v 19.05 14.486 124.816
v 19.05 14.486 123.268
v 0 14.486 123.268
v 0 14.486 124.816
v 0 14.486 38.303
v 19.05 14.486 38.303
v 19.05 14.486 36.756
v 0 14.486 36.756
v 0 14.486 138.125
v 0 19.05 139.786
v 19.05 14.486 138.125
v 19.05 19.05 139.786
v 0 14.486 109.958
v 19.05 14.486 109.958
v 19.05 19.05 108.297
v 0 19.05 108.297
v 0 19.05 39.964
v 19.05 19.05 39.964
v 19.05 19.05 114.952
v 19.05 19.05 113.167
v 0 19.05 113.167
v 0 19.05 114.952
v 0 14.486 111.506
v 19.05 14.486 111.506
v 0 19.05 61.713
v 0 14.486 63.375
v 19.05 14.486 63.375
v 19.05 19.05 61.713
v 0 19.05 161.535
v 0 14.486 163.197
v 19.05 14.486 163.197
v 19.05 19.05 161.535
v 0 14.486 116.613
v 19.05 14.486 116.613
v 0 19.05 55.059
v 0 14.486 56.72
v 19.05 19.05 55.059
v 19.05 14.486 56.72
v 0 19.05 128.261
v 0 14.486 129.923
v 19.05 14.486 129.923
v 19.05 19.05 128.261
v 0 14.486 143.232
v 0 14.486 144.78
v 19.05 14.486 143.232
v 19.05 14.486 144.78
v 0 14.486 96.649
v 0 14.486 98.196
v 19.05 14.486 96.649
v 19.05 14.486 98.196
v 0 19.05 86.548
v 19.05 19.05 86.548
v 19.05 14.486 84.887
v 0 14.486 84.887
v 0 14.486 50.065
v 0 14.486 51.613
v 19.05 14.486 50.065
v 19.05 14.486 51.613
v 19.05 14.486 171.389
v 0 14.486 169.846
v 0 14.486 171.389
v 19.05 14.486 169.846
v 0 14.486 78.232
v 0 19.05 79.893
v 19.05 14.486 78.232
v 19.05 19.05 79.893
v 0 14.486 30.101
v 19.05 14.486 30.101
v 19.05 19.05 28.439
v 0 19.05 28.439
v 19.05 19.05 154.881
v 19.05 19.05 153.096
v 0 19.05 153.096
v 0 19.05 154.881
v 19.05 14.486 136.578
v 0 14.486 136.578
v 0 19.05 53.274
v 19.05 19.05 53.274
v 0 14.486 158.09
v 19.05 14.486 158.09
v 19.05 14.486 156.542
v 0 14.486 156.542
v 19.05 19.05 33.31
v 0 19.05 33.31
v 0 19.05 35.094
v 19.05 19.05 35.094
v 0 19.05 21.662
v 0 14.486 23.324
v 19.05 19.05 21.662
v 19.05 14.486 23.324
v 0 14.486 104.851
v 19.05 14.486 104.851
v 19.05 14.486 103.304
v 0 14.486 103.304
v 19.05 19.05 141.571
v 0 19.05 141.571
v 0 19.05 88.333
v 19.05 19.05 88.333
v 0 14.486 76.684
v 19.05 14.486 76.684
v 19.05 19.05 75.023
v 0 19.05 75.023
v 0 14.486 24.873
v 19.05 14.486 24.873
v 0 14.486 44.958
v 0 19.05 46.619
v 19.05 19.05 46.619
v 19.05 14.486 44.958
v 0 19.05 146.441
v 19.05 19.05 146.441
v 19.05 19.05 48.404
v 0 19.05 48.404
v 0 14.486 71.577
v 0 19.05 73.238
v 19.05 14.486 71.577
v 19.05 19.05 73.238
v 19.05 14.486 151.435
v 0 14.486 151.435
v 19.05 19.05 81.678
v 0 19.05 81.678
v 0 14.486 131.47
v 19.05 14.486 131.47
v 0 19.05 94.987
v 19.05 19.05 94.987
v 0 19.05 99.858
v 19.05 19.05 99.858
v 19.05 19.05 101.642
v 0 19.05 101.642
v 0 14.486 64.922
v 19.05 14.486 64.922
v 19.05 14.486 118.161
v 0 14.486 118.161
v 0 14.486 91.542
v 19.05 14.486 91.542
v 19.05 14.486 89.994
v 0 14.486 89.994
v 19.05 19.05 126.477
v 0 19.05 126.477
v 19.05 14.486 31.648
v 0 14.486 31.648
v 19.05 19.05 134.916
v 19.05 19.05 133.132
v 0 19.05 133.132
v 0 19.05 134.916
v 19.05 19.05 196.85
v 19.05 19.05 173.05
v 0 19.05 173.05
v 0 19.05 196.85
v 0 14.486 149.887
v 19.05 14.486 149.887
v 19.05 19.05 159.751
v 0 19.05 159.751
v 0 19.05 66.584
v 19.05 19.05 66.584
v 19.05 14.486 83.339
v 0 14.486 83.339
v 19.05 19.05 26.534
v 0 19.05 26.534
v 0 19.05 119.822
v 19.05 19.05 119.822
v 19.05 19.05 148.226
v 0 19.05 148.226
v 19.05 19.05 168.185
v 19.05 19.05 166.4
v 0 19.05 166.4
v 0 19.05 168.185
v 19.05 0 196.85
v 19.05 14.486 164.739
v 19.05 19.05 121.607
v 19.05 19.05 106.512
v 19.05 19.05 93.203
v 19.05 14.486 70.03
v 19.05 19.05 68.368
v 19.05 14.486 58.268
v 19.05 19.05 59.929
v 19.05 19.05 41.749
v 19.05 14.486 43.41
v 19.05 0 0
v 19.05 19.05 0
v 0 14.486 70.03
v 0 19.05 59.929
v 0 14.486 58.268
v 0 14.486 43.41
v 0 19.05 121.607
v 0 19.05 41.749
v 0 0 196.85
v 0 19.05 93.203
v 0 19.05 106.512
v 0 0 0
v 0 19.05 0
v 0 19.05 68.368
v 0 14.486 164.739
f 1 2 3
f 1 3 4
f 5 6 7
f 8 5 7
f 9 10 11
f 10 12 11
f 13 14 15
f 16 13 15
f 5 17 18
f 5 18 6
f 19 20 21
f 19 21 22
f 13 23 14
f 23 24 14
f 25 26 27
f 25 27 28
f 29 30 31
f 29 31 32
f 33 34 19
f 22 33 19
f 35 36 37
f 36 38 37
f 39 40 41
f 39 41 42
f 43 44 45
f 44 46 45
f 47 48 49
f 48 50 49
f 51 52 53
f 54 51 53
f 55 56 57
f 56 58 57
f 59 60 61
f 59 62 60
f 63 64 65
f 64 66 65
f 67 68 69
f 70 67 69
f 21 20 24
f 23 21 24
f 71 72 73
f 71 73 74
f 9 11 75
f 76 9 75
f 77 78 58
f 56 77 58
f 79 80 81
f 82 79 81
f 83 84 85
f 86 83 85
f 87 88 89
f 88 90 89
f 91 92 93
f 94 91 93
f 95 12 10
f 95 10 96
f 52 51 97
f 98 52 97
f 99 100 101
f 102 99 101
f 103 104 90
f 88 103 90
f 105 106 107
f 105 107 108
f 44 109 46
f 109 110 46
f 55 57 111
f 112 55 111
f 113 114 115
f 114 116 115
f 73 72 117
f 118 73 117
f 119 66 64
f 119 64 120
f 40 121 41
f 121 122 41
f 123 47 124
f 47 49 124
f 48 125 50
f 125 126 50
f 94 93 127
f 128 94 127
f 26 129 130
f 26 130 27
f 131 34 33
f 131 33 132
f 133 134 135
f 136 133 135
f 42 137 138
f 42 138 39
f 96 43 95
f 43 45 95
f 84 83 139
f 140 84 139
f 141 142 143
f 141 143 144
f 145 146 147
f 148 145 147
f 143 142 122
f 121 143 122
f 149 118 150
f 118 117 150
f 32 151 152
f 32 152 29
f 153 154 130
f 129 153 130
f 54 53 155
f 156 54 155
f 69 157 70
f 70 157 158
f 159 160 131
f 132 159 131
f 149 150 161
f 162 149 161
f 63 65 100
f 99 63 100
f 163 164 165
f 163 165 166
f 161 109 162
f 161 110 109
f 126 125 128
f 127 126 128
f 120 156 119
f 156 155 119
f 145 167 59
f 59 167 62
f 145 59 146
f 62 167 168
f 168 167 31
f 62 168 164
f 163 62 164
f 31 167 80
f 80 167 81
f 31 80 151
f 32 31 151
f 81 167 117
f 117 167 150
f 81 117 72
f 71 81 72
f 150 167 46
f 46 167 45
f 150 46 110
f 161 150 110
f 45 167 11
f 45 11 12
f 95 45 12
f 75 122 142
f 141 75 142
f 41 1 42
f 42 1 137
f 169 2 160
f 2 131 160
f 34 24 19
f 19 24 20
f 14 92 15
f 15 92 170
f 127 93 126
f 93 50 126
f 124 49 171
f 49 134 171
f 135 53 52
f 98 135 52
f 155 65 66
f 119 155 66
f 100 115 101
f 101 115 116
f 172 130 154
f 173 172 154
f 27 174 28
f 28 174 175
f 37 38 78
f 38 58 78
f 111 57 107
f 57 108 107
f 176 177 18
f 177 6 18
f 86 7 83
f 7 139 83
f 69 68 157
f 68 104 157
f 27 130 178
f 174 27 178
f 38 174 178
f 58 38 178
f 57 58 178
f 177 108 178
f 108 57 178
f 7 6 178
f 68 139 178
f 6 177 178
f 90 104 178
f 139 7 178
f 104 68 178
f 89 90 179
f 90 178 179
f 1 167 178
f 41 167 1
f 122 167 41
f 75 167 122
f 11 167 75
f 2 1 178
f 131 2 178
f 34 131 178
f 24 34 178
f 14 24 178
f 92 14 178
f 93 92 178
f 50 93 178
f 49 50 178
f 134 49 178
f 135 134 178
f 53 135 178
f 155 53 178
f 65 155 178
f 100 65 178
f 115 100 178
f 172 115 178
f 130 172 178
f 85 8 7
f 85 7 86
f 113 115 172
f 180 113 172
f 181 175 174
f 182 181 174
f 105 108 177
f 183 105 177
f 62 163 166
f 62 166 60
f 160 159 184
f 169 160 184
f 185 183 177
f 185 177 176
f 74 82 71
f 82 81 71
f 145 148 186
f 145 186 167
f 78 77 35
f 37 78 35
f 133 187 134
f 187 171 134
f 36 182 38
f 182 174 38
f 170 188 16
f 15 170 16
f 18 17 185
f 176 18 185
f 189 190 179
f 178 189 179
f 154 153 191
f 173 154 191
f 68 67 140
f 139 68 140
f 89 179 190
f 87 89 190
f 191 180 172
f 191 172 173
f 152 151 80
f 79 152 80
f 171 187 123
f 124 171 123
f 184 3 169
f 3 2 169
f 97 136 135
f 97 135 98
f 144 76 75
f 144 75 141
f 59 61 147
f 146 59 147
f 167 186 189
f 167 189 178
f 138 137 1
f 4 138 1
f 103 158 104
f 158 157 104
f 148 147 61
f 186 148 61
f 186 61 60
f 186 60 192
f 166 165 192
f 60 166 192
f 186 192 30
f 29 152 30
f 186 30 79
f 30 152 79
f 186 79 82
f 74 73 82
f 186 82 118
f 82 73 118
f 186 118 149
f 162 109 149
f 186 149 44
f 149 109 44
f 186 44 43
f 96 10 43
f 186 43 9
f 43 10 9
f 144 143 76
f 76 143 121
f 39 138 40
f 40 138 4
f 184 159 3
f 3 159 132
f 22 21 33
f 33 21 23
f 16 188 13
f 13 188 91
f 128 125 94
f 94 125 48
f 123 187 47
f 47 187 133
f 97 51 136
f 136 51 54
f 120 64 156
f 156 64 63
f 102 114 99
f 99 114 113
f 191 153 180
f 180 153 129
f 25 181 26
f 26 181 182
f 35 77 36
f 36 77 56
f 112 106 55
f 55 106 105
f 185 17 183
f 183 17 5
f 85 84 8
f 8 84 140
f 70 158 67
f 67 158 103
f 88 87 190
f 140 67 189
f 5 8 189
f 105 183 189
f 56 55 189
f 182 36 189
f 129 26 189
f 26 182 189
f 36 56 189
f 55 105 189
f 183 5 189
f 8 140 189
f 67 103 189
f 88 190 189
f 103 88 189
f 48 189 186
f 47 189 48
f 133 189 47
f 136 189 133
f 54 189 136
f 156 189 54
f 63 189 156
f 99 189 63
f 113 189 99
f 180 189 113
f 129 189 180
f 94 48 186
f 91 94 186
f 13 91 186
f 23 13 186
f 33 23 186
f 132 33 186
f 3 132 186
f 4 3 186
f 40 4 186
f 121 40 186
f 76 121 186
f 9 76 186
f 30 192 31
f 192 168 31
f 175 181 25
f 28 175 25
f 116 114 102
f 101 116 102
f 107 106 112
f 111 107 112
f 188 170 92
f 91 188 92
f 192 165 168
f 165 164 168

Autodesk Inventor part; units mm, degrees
sketch "Sketch1" plane through (0, 0, 0) normal (0, 0, 1) x (1, 0, 0)
  line L0 (0, 0) -> (19.05, 0)
  line L1 (19.05, 0) -> (19.05, 19.05)
  line L2 (19.05, 19.05) -> (0, 19.05)
  line L3 (0, 19.05) -> (0, 0)
  dimension "d0" = 19.05
  dimension "d1" = 19.05
extrude "Extrusion1" add sketch "Sketch1" along normal blind 196.85
sketch "Sketch2" plane through (19.05, 0, 0) normal (1, 0, 0) x (0, 0, -1)
  line L0 (0, 0) -> (0, 19.05) projected
  line L1 (0, 19.05) -> (-196.85, 19.05) projected
  line L2 (-196.85, 19.05) -> (-196.85, 0) projected
  line L3 (0, 0) -> (-196.85, 0) projected
  line L4 (-168.1851, 19.05) -> (-166.4005, 19.05)
  line L5 (-166.4005, 19.05) -> (-164.7392, 14.4856)
  line L6 (-168.1851, 19.05) -> (-169.8464, 14.4856)
  line L7 (-167.2928, 19.05) -> (-167.2928, 27.5407) construction
  line L8 (-130.1446, 19.8229) -> (-130.1446, 4.5609) construction
  line L9 (-173.4311, 16.9342) -> (-94.8151, 16.9342) construction
  line L10 (-163.1967, 14.4856) -> (-161.5354, 19.05)
  line L11 (-161.5354, 19.05) -> (-159.7508, 19.05)
  line L12 (-159.7508, 19.05) -> (-158.0895, 14.4856)
  line L13 (-164.7392, 14.4856) -> (-163.1967, 14.4856)
  line L14 (-158.0895, 14.4856) -> (-24.9935, 14.4856) construction
  line L15 (-160.6431, 19.05) -> (-160.6431, 25.2679) construction
  line L16 (-169.8464, 14.4856) -> (-171.3889, 14.4856)
  line L17 (-171.3889, 14.4856) -> (-173.0502, 19.05)
  line L18 (-156.5419, 14.4856) -> (-154.8806, 19.05)
  line L19 (-154.8806, 19.05) -> (-153.096, 19.05)
  line L20 (-153.096, 19.05) -> (-151.4347, 14.4856)
  line L21 (-149.8871, 14.4856) -> (-148.2258, 19.05)
  line L22 (-148.2258, 19.05) -> (-146.4412, 19.05)
  line L23 (-146.4412, 19.05) -> (-144.7799, 14.4856)
  line L24 (-143.2323, 14.4856) -> (-141.571, 19.05)
  line L25 (-141.571, 19.05) -> (-139.7864, 19.05)
  line L26 (-139.7864, 19.05) -> (-138.1251, 14.4856)
  line L27 (-136.5775, 14.4856) -> (-134.9162, 19.05)
  line L28 (-134.9162, 19.05) -> (-133.1316, 19.05)
  line L29 (-133.1316, 19.05) -> (-131.4703, 14.4856)
  line L30 (-129.9227, 14.4856) -> (-128.2614, 19.05)
  line L31 (-128.2614, 19.05) -> (-126.4768, 19.05)
  line L32 (-126.4768, 19.05) -> (-124.8155, 14.4856)
  line L33 (-123.2679, 14.4856) -> (-121.6066, 19.05)
  line L34 (-121.6066, 19.05) -> (-119.822, 19.05)
  line L35 (-119.822, 19.05) -> (-118.1607, 14.4856)
  line L36 (-116.6131, 14.4856) -> (-114.9518, 19.05)
  line L37 (-114.9518, 19.05) -> (-113.1672, 19.05)
  line L38 (-113.1672, 19.05) -> (-111.5059, 14.4856)
  line L39 (-109.9583, 14.4856) -> (-108.297, 19.05)
  line L40 (-108.297, 19.05) -> (-106.5124, 19.05)
  line L41 (-106.5124, 19.05) -> (-104.8511, 14.4856)
  line L42 (-103.3035, 14.4856) -> (-101.6422, 19.05)
  line L43 (-101.6422, 19.05) -> (-99.8576, 19.05)
  line L44 (-99.8576, 19.05) -> (-98.1963, 14.4856)
  line L45 (-96.6487, 14.4856) -> (-94.9874, 19.05)
  line L46 (-94.9874, 19.05) -> (-93.2028, 19.05)
  line L47 (-93.2028, 19.05) -> (-91.5415, 14.4856)
  line L48 (-89.9939, 14.4856) -> (-88.3326, 19.05)
  line L49 (-88.3326, 19.05) -> (-86.548, 19.05)
  line L50 (-86.548, 19.05) -> (-84.8867, 14.4856)
  line L51 (-83.3391, 14.4856) -> (-81.6778, 19.05)
  line L52 (-81.6778, 19.05) -> (-79.8932, 19.05)
  line L53 (-79.8932, 19.05) -> (-78.2319, 14.4856)
  line L54 (-76.6843, 14.4856) -> (-75.023, 19.05)
  line L55 (-75.023, 19.05) -> (-73.2384, 19.05)
  line L56 (-73.2384, 19.05) -> (-71.5771, 14.4856)
  line L57 (-70.0295, 14.4856) -> (-68.3682, 19.05)
  line L58 (-68.3682, 19.05) -> (-66.5836, 19.05)
  line L59 (-66.5836, 19.05) -> (-64.9223, 14.4856)
  line L60 (-63.3747, 14.4856) -> (-61.7134, 19.05)
  line L61 (-61.7134, 19.05) -> (-59.9288, 19.05)
  line L62 (-59.9288, 19.05) -> (-58.2675, 14.4856)
  line L63 (-56.7199, 14.4856) -> (-55.0586, 19.05)
  line L64 (-55.0586, 19.05) -> (-53.274, 19.05)
  line L65 (-53.274, 19.05) -> (-51.6127, 14.4856)
  line L66 (-50.0651, 14.4856) -> (-48.4038, 19.05)
  line L67 (-48.4038, 19.05) -> (-46.6192, 19.05)
  line L68 (-46.6192, 19.05) -> (-44.9579, 14.4856)
  line L69 (-43.4103, 14.4856) -> (-41.749, 19.05)
  line L70 (-41.749, 19.05) -> (-39.9644, 19.05)
  line L71 (-39.9644, 19.05) -> (-38.3031, 14.4856)
  line L72 (-36.7555, 14.4856) -> (-35.0942, 19.05)
  line L73 (-35.0942, 19.05) -> (-33.3096, 19.05)
  line L74 (-33.3096, 19.05) -> (-31.6483, 14.4856)
  line L75 (-30.1007, 14.4856) -> (-28.4394, 19.05)
  line L76 (-28.4394, 19.05) -> (-26.6548, 19.05) construction
  line L77 (-26.6548, 19.05) -> (-24.9935, 14.4856) construction
  line L78 (-158.0895, 14.4856) -> (-156.5419, 14.4856)
  line L79 (-151.4347, 14.4856) -> (-149.8871, 14.4856)
  line L80 (-144.7799, 14.4856) -> (-143.2323, 14.4856)
  line L81 (-138.1251, 14.4856) -> (-136.5775, 14.4856)
  line L82 (-131.4703, 14.4856) -> (-129.9227, 14.4856)
  line L83 (-124.5031, 14.4856) -> (-123.2679, 14.4856)
  line L84 (-117.895, 14.4856) -> (-116.6131, 14.4856)
  line L85 (-124.5031, 14.4856) -> (-124.8155, 14.4856)
  line L86 (-117.895, 14.4856) -> (-118.1607, 14.4856)
  line L87 (-111.5059, 14.4856) -> (-109.9583, 14.4856)
  line L88 (-104.8511, 14.4856) -> (-103.3035, 14.4856)
  line L89 (-98.1963, 14.4856) -> (-96.6487, 14.4856)
  line L90 (-91.5415, 14.4856) -> (-89.9939, 14.4856)
  line L91 (-84.8867, 14.4856) -> (-83.3391, 14.4856)
  line L92 (-78.2319, 14.4856) -> (-76.6843, 14.4856)
  line L93 (-71.5771, 14.4856) -> (-70.0295, 14.4856)
  line L94 (-64.9223, 14.4856) -> (-63.3747, 14.4856)
  line L95 (-58.2675, 14.4856) -> (-56.7199, 14.4856)
  line L96 (-51.6127, 14.4856) -> (-50.0651, 14.4856)
  line L97 (-44.9579, 14.4856) -> (-43.4103, 14.4856)
  line L98 (-30.1007, 14.4856) -> (-31.6483, 14.4856)
  line L99 (-38.3031, 14.4856) -> (-36.7555, 14.4856)
  line L100 (-28.4394, 19.05) -> (0, 19.05)
  line L101 (0, 0) -> (0, 19.05)
  line L102 (0, 0) -> (-196.85, 0)
  line L103 (-196.85, 0) -> (-196.85, 19.05)
  line L104 (-196.85, 19.05) -> (-173.0502, 19.05)
  point P0 (-168.9552, 16.9342)
  point P1 (-165.6304, 16.9342)
  point P2 (-162.3055, 16.9342)
  point P3 (-158.9807, 16.9342)
  point P4 (-172.2801, 16.9342)
  point P5 (-153.9883, 19.05)
  point P6 (-155.6507, 16.9342)
  point P7 (-152.3259, 16.9342)
  point P8 (-147.3335, 19.05)
  point P9 (-148.9959, 16.9342)
  point P10 (-145.6711, 16.9342)
  point P11 (-140.6787, 19.05)
  point P12 (-142.3411, 16.9342)
  point P13 (-139.0163, 16.9342)
  point P14 (-134.0239, 19.05)
  point P15 (-135.6863, 16.9342)
  point P16 (-132.3615, 16.9342)
  point P17 (-127.3691, 19.05)
  point P18 (-129.0315, 16.9342)
  point P19 (-125.7067, 16.9342)
  point P20 (-120.7143, 19.05)
  point P21 (-122.3767, 16.9342)
  point P22 (-119.0519, 16.9342)
  point P23 (-114.0595, 19.05)
  point P24 (-115.7219, 16.9342)
  point P25 (-112.3971, 16.9342)
  point P26 (-107.4047, 19.05)
  point P27 (-109.0671, 16.9342)
  point P28 (-105.7423, 16.9342)
  point P29 (-100.7499, 19.05)
  point P30 (-102.4123, 16.9342)
  point P31 (-99.0875, 16.9342)
  point P32 (-94.0951, 19.05)
  point P33 (-95.7575, 16.9342)
  point P34 (-92.4327, 16.9342)
  point P35 (-87.4403, 19.05)
  point P36 (-89.1027, 16.9342)
  point P37 (-85.7779, 16.9342)
  point P38 (-80.7855, 19.05)
  point P39 (-82.4479, 16.9342)
  point P40 (-79.1231, 16.9342)
  point P41 (-74.1307, 19.05)
  point P42 (-75.7931, 16.9342)
  point P43 (-72.4683, 16.9342)
  point P44 (-67.4759, 19.05)
  point P45 (-69.1383, 16.9342)
  point P46 (-65.8135, 16.9342)
  point P47 (-60.8211, 19.05)
  point P48 (-62.4835, 16.9342)
  point P49 (-59.1587, 16.9342)
  point P50 (-54.1663, 19.05)
  point P51 (-55.8287, 16.9342)
  point P52 (-52.5039, 16.9342)
  point P53 (-47.5115, 19.05)
  point P54 (-49.1739, 16.9342)
  point P55 (-45.8491, 16.9342)
  point P56 (-40.8567, 19.05)
  point P57 (-42.5191, 16.9342)
  point P58 (-39.1943, 16.9342)
  point P59 (-34.2019, 19.05)
  point P60 (-35.8643, 16.9342)
  point P61 (-32.5395, 16.9342)
  point P62 (-27.5471, 19.05)
  point P63 (-29.2095, 16.9342)
  point P64 (-25.8847, 16.9342)
  dimension "d5" = 2.1158
  dimension "d6" = 20
  dimension "d7" = 20
  dimension "d11" = 6.6497
  dimension "d12" = 3.3249
  dimension "d13" = 3.3249
  dimension "d14" = 3.3249
  dimension "d15" = 23.7998
  dimension "d16" = 2.4486
  dimension "d19" = 6.6548
extrude "Extrusion2" cut sketch "Sketch2" against normal through all contours L3 L2 L1 L17 L16 L6 L5 L13 L10 L12 L78 L18 L20 L79 L21 L23 L80 L24 L26 L81 L27 L29 L82 L30 L32 L85 L83 L33 L35 L86 L84 L36 L38 L87 L39 L41 L88 L42 L44 L89 L45 L47 L90 L48 L50 L91 L51 L53 L92 L54 L56 L93 L57 L59 L94 L60 L62 L95 L63 L65 L96 L66 L68 L97 L69 L71 L99 L72 L74 L98 L75 L0 keep common part
sketch "Sketch5" plane through (19.05, 0, 196.85) normal (1, 0, 0) x (0, 0, -1)
  line L0 (126.8205, 14.4856) -> (128.4818, 19.05) projected
  line L1 (125.2729, 14.4856) -> (126.8205, 14.4856) projected
  line L2 (123.6116, 19.05) -> (125.2729, 14.4856) projected
  line L3 (123.6116, 19.05) -> (121.827, 19.05) projected
  line L4 (120.1657, 14.4856) -> (121.827, 19.05) projected
  line L5 (118.6181, 14.4856) -> (120.1657, 14.4856) projected
  line L6 (116.9568, 19.05) -> (118.6181, 14.4856) projected
  line L7 (116.9568, 19.05) -> (115.1722, 19.05) projected
  line L8 (113.5109, 14.4856) -> (115.1722, 19.05) projected
  line L9 (111.9633, 14.4856) -> (113.5109, 14.4856) projected
  line L10 (110.302, 19.05) -> (111.9633, 14.4856) projected
  line L11 (110.302, 19.05) -> (108.5174, 19.05) projected
  line L12 (106.8561, 14.4856) -> (108.5174, 19.05) projected
  line L13 (105.3085, 14.4856) -> (106.8561, 14.4856) projected
  line L14 (103.6472, 19.05) -> (105.3085, 14.4856) projected
  line L15 (103.6472, 19.05) -> (101.8626, 19.05) projected
  line L16 (100.2013, 14.4856) -> (101.8626, 19.05) projected
  line L17 (98.6537, 14.4856) -> (100.2013, 14.4856) projected
  line L18 (96.9924, 19.05) -> (98.6537, 14.4856) projected
  line L19 (96.9924, 19.05) -> (95.2078, 19.05) projected
  line L20 (93.5465, 14.4856) -> (95.2078, 19.05) projected
  line L21 (91.9989, 14.4856) -> (93.5465, 14.4856) projected
  line L22 (90.3376, 19.05) -> (91.9989, 14.4856) projected
  line L23 (90.3376, 19.05) -> (88.553, 19.05) projected
  line L24 (86.8917, 14.4856) -> (88.553, 19.05) projected
  line L25 (85.3441, 14.4856) -> (86.8917, 14.4856) projected
  line L26 (83.6828, 19.05) -> (85.3441, 14.4856) projected
  line L27 (83.6828, 19.05) -> (81.8982, 19.05) projected
  line L28 (80.2369, 14.4856) -> (81.8982, 19.05) projected
  line L29 (78.6893, 14.4856) -> (80.2369, 14.4856) projected
  line L30 (77.028, 19.05) -> (78.6893, 14.4856) projected
  line L31 (77.028, 19.05) -> (75.2434, 19.05) projected
  line L32 (73.5821, 14.4856) -> (75.2434, 19.05) projected
  line L33 (72.0345, 14.4856) -> (73.5821, 14.4856) projected
  line L34 (70.3732, 19.05) -> (72.0345, 14.4856) projected
  line L35 (70.3732, 19.05) -> (68.5886, 19.05) projected
  line L36 (66.9273, 14.4856) -> (68.5886, 19.05) projected
  line L37 (65.3797, 14.4856) -> (66.9273, 14.4856) projected
  line L38 (63.7184, 19.05) -> (65.3797, 14.4856) projected
  line L39 (63.7184, 19.05) -> (61.9338, 19.05) projected
  line L40 (60.2725, 14.4856) -> (61.9338, 19.05) projected
  line L41 (58.7249, 14.4856) -> (60.2725, 14.4856) projected
  line L42 (57.0636, 19.05) -> (58.7249, 14.4856) projected
  line L43 (57.0636, 19.05) -> (55.279, 19.05) projected
  line L44 (53.6177, 14.4856) -> (55.279, 19.05) projected
  line L45 (52.0701, 14.4856) -> (53.6177, 14.4856) projected
  line L46 (50.4088, 19.05) -> (52.0701, 14.4856) projected
  line L47 (50.4088, 19.05) -> (48.6242, 19.05) projected
  line L48 (46.9629, 14.4856) -> (48.6242, 19.05) projected
  line L49 (45.4153, 14.4856) -> (46.9629, 14.4856) projected
  line L50 (43.754, 19.05) -> (45.4153, 14.4856) projected
  line L51 (43.754, 19.05) -> (41.9694, 19.05) projected
  line L52 (40.3081, 14.4856) -> (41.9694, 19.05) projected
  line L53 (38.7605, 14.4856) -> (40.3081, 14.4856) projected
  line L54 (37.0992, 19.05) -> (38.7605, 14.4856) projected
  line L55 (37.0992, 19.05) -> (35.3146, 19.05) projected
  line L56 (33.6533, 14.4856) -> (35.3146, 19.05) projected
  line L57 (32.1108, 14.4856) -> (33.6533, 14.4856) projected
  line L58 (30.4495, 19.05) -> (32.1108, 14.4856) projected
  line L59 (30.4495, 19.05) -> (28.6649, 19.05) projected
  line L60 (27.0036, 14.4856) -> (28.6649, 19.05) projected
  line L61 (25.4611, 14.4856) -> (27.0036, 14.4856) projected
  line L62 (23.7998, 19.05) -> (25.4611, 14.4856) projected
  line L63 (23.7998, 19.05) -> (0, 19.05) projected
  line L64 (0, 19.05) -> (0, 0) projected
  line L65 (196.85, 0) -> (0, 0) projected
  line L66 (196.85, 0) -> (196.85, 19.05) projected
  line L67 (196.85, 19.05) -> (168.4106, 19.05) projected
  line L68 (166.7493, 14.4856) -> (168.4106, 19.05) projected
  line L69 (165.2017, 14.4856) -> (166.7493, 14.4856) projected
  line L70 (163.5404, 19.05) -> (165.2017, 14.4856) projected
  line L71 (163.5404, 19.05) -> (161.7558, 19.05) projected
  line L72 (160.0945, 14.4856) -> (161.7558, 19.05) projected
  line L73 (158.5469, 14.4856) -> (160.0945, 14.4856) projected
  line L74 (156.8856, 19.05) -> (158.5469, 14.4856) projected
  line L75 (156.8856, 19.05) -> (155.101, 19.05) projected
  line L76 (153.4397, 14.4856) -> (155.101, 19.05) projected
  line L77 (151.8921, 14.4856) -> (153.4397, 14.4856) projected
  line L78 (150.2308, 19.05) -> (151.8921, 14.4856) projected
  line L79 (150.2308, 19.05) -> (148.4462, 19.05) projected
  line L80 (146.7849, 14.4856) -> (148.4462, 19.05) projected
  line L81 (145.2373, 14.4856) -> (146.7849, 14.4856) projected
  line L82 (143.576, 19.05) -> (145.2373, 14.4856) projected
  line L83 (143.576, 19.05) -> (141.7914, 19.05) projected
  line L84 (140.1301, 14.4856) -> (141.7914, 19.05) projected
  line L85 (138.5825, 14.4856) -> (140.1301, 14.4856) projected
  line L86 (136.9212, 19.05) -> (138.5825, 14.4856) projected
  line L87 (136.9212, 19.05) -> (135.1366, 19.05) projected
  line L88 (133.4753, 14.4856) -> (135.1366, 19.05) projected
  line L89 (131.9277, 14.4856) -> (133.4753, 14.4856) projected
  line L90 (130.2664, 19.05) -> (131.9277, 14.4856) projected
  line L91 (130.2664, 19.05) -> (128.4818, 19.05) projected
  line L92 (168.4106, 19.05) -> (170.3156, 19.05)
  line L93 (170.3156, 19.05) -> (171.9769, 14.4856)
  line L94 (171.9769, 14.4856) -> (173.5263, 14.4856)
  line L95 (173.5263, 14.4856) -> (175.1876, 19.05)
  line L96 (170.3156, 19.05) -> (175.1876, 19.05)
  dimension "d26" = 1.5494
  dimension "d27" = 1.905
extrude "Extrusion3" cut sketch "Sketch5" against normal blind 25.4 contours L67 L95 L94 L93
ref_plane "Work Plane1" through (9.525, 0, 196.85) normal (1, 0, 0) x (0, 0, -1)
ref_plane "Work Plane2" through (0, 0, 98.425) normal (0, 0, -1) x (-1, 0, 0)
sketch "Sketch6" plane through (0, 0, 0) normal (-1, 0, 0) x (0, 0, 1)
  line L0 (28.4394, 19.05) -> (30.1007, 14.4856) projected
  line L1 (30.1007, 14.4856) -> (28.4394, 19.05) projected
  line L2 (22.4325, 16.9342) -> (172.2801, 16.9342)
  dimension "d1" = 19.05
  dimension "d30" = 149.8476
ref_plane "Work Plane3" through (0, 16.9342, 172.2801) normal (0, 1, 0) x (-1, 0, 0)
sketch "Sketch7" plane through (0, 0, 0) normal (-1, 0, 0) x (0, 0, 1)
  line L0 (169.8464, 14.4856) -> (171.3889, 14.4856) projected
  line L1 (169.8464, 14.4856) -> (169.8464, 42.6146)
  line L2 (168.1851, 19.05) -> (169.8464, 14.4856) projected
  point P0 (0, 0)
  dimension "d1" = 19.05
ref_plane "Work Plane4" through (0, 16.9342, 172.2801) normal (0, 0, 1) x (1, 0, 0)
ref_plane "Work Plane5" through (0, 16.7678, 22.4931) normal (0, 0, -1) x (-1, 0, 0)
sketch "Sketch8" plane through (0, 0, 0) normal (-1, 0, 0) x (0, 0, 1)
  line L0 (172.2801, 28.8683) -> (172.2801, 16.9342)
  line L1 (157.4011, 16.9342) -> (157.4011, 0)
  line L2 (37.3775, 0) -> (37.3775, 16.9342)
  line L3 (172.2801, 28.8683) -> (172.2801, 16.9342)
  line L4 (22.4931, 28.8683) -> (22.4931, 16.9342)
  line L5 (22.4931, 16.9342) -> (157.4011, 16.9342)
  line L6 (157.4011, 16.9342) -> (172.2801, 16.9342)
  dimension "d1" = 19.05
  dimension "d32" = 120.0236
sketch "Sketch9" plane through (19.05, 0, 196.85) normal (1, 0, 0) x (0, 0, -1)
  line L0 (24.5699, 28.8683) -> (24.5699, 16.9342) projected
  line L1 (39.4489, 16.9342) -> (39.4489, 0) projected
  line L2 (159.4725, 0) -> (159.4725, 16.9342) projected
  line L3 (174.3569, 28.8683) -> (174.3569, 16.9342) projected
  line L4 (24.5699, 16.9342) -> (174.3569, 16.9342)
  point P0 (196.85, 0)
  dimension "d1" = 19.05
  dimension "d33" = 120.0236
sketch "Sketch10" plane through (19.05, 0, 196.85) normal (1, 0, 0) x (0, 0, -1)
  line L0 (152.5443, 11.2798) -> (167.7772, 11.2798) construction
  line L1 (167.7772, 11.2798) -> (167.7772, 4.5864) construction
  line L2 (167.7772, 4.5864) -> (152.5443, 4.5864) construction
  line L3 (152.5443, 4.5864) -> (152.5443, 11.2798) construction
  point P0 (196.85, 0)
  dimension "d1" = 19.05
ref_plane "Work Plane7" through (19.05, 16.9342, 37.3775) normal (0, 0, -1) x (-1, 0, 0)
equation "\"d13\" = d12"
equation "\"d14\" = d12"
properties part number "RAM" material "Steel, High Strength Low Alloy"
